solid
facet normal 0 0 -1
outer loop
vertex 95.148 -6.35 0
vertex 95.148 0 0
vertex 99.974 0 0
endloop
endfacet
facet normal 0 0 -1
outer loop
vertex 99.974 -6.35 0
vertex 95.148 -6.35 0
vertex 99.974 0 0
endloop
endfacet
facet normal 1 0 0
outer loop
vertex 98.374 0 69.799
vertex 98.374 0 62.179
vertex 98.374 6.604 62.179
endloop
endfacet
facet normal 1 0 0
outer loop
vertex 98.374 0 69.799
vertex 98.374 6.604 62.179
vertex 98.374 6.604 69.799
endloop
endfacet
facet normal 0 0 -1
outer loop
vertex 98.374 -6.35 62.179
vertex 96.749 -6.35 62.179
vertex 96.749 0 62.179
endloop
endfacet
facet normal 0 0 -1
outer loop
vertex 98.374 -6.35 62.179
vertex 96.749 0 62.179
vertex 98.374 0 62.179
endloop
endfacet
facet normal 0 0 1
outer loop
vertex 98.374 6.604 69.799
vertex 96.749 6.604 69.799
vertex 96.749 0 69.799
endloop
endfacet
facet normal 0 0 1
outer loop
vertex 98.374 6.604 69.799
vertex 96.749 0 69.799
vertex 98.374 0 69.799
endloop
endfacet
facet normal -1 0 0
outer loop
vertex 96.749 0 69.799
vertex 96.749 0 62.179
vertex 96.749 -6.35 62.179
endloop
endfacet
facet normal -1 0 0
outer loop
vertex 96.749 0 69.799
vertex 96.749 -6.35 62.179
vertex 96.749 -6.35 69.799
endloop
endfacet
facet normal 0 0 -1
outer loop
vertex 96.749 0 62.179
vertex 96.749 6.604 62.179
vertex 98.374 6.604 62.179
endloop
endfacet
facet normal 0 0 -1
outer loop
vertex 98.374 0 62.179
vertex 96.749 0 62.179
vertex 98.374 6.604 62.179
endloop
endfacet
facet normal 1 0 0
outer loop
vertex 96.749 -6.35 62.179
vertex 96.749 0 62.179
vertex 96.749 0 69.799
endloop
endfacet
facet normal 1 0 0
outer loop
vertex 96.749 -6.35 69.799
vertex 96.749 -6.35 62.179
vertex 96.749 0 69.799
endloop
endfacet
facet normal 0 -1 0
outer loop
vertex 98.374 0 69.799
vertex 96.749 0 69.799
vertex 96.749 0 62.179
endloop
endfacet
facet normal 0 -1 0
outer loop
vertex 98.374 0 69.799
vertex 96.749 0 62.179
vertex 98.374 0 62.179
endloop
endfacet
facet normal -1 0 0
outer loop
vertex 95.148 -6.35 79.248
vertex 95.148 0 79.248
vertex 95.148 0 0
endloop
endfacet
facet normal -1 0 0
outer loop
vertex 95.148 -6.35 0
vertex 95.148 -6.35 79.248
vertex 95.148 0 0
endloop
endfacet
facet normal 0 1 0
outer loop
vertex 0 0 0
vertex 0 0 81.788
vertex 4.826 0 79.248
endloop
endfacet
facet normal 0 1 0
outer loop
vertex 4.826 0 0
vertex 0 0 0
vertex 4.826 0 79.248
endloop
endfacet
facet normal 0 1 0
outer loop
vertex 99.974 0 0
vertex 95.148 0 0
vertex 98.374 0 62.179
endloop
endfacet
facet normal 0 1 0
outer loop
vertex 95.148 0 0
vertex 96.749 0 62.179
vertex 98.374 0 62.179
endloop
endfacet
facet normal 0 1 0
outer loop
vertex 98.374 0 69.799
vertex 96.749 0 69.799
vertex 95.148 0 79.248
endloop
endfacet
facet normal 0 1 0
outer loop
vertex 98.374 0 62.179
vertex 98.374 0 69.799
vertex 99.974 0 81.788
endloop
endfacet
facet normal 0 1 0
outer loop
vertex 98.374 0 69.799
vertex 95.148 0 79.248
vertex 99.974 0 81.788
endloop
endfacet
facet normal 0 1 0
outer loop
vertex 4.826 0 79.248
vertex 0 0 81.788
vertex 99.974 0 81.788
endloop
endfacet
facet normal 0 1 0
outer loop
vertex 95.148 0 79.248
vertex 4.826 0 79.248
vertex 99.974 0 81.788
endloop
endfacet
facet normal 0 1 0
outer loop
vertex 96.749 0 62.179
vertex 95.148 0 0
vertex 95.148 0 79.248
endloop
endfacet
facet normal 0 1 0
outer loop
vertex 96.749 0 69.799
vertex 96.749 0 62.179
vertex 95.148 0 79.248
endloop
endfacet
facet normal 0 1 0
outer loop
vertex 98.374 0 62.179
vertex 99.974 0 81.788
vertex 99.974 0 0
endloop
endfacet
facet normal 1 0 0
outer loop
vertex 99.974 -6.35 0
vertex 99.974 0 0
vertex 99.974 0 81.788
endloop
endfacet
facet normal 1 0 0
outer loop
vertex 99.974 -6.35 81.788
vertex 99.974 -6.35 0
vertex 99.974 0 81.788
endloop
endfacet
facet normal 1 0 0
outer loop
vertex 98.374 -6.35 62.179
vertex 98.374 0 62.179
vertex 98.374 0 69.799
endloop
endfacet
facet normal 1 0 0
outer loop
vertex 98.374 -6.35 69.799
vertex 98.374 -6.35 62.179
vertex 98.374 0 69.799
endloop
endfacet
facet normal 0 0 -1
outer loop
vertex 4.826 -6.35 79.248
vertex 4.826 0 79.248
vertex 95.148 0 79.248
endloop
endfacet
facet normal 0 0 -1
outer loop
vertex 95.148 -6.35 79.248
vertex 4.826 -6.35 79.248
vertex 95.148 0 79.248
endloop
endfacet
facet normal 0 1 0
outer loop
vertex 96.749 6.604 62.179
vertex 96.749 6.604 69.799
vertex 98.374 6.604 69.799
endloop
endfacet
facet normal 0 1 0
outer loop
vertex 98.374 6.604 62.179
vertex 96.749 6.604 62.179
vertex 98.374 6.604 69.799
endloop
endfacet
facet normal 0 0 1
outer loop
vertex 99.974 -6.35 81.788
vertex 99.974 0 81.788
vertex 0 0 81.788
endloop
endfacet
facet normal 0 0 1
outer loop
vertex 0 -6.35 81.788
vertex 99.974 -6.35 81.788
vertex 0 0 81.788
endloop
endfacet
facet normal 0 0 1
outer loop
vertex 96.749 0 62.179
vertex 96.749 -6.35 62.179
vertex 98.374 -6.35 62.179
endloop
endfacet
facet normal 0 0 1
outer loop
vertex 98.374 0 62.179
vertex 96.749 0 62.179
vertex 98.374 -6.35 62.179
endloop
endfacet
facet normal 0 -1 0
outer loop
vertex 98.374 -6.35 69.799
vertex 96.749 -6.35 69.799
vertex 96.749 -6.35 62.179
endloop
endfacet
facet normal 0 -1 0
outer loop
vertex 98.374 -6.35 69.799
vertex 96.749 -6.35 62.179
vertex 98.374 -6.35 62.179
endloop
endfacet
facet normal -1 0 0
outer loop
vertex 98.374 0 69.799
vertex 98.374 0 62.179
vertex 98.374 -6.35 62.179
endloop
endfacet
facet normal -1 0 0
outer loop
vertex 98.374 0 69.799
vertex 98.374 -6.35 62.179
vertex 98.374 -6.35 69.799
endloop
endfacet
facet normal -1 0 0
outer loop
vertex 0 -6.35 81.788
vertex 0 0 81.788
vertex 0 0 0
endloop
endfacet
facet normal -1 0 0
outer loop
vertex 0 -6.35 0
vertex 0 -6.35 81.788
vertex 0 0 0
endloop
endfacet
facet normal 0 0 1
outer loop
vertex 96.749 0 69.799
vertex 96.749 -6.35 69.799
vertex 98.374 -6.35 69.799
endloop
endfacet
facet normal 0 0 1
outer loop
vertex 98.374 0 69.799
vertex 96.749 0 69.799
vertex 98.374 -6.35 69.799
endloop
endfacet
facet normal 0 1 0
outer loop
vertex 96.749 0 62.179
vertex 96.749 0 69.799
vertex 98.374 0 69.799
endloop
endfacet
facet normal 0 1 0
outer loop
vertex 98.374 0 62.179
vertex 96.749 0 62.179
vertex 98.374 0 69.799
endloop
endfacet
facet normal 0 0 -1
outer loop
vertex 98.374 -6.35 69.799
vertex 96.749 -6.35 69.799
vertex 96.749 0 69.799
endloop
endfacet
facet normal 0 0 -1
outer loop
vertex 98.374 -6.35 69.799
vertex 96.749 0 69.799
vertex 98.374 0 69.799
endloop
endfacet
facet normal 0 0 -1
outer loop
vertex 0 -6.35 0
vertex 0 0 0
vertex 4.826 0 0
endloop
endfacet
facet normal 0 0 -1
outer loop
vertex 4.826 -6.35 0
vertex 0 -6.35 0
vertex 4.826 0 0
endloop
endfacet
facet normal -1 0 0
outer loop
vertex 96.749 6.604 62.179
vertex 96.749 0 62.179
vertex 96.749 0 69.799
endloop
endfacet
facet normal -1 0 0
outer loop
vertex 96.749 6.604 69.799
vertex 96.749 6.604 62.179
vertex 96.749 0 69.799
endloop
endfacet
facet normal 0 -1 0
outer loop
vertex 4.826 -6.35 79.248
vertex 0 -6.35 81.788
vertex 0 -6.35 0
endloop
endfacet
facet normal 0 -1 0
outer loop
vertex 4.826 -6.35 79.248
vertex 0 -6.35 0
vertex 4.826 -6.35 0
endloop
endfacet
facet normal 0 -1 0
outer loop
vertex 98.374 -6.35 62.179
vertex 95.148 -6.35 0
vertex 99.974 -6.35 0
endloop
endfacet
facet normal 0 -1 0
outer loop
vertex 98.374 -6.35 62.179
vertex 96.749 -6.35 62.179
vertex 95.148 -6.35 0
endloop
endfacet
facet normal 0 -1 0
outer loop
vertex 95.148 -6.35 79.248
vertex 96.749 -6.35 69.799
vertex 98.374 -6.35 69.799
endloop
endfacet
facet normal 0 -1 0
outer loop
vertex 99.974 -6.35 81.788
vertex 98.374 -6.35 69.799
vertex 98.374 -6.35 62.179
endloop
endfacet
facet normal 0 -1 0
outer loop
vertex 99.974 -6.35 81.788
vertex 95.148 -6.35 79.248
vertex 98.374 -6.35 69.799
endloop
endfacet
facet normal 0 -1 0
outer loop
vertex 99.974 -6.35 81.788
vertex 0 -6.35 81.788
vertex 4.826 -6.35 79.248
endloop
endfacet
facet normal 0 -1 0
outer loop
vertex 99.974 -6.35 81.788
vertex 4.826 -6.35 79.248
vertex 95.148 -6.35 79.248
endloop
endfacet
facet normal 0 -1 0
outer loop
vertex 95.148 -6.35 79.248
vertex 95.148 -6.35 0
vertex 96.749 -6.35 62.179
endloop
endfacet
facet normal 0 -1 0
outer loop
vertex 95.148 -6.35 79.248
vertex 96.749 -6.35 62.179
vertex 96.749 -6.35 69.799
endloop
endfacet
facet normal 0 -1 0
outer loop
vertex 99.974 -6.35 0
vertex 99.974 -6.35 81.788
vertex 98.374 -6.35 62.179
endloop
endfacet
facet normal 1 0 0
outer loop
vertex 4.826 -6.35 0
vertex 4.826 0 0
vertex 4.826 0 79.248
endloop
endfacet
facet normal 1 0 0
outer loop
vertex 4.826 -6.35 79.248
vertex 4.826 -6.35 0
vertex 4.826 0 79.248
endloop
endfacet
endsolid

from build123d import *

# Parameters (mm, degrees)
F0_W     = 1.6256
F0_H     = 7.62
F1_DEPTH = 6.35
F2_DEPTH = 6.35
F3_DEPTH = 6.604


with BuildPart() as f1:
    # F0 (on Front) → F1 (new body)
    with BuildSketch(Plane.XZ):
        Polygon((99.9744, 81.788), (0, 81.788), (0, 0), (4.826, 0), (4.826, 40.894), (4.826, 79.248), (49.9872, 79.248), (95.1484, 79.248), (95.1484, 40.894), (95.1484, 0), (99.9744, 0), align=None)
        with Locations((97.5614, 65.9892)):
            Rectangle(F0_W, F0_H, mode=Mode.SUBTRACT)
    extrude(amount=F1_DEPTH)


with BuildPart() as f2:
    # F0 (on Front) → F2 (new body)
    with BuildSketch(Plane.XZ):
        with Locations((97.5614, 65.9892)):
            Rectangle(F0_W, F0_H)
    extrude(amount=F2_DEPTH)


with BuildPart() as f3:
    # F0 (on Front) → F3 (new body)
    with BuildSketch(Plane.XZ):
        with Locations((97.5614, 65.9892)):
            Rectangle(F0_W, F0_H)
    extrude(amount=-F3_DEPTH)


solid = Compound([f1.part, f2.part, f3.part])
